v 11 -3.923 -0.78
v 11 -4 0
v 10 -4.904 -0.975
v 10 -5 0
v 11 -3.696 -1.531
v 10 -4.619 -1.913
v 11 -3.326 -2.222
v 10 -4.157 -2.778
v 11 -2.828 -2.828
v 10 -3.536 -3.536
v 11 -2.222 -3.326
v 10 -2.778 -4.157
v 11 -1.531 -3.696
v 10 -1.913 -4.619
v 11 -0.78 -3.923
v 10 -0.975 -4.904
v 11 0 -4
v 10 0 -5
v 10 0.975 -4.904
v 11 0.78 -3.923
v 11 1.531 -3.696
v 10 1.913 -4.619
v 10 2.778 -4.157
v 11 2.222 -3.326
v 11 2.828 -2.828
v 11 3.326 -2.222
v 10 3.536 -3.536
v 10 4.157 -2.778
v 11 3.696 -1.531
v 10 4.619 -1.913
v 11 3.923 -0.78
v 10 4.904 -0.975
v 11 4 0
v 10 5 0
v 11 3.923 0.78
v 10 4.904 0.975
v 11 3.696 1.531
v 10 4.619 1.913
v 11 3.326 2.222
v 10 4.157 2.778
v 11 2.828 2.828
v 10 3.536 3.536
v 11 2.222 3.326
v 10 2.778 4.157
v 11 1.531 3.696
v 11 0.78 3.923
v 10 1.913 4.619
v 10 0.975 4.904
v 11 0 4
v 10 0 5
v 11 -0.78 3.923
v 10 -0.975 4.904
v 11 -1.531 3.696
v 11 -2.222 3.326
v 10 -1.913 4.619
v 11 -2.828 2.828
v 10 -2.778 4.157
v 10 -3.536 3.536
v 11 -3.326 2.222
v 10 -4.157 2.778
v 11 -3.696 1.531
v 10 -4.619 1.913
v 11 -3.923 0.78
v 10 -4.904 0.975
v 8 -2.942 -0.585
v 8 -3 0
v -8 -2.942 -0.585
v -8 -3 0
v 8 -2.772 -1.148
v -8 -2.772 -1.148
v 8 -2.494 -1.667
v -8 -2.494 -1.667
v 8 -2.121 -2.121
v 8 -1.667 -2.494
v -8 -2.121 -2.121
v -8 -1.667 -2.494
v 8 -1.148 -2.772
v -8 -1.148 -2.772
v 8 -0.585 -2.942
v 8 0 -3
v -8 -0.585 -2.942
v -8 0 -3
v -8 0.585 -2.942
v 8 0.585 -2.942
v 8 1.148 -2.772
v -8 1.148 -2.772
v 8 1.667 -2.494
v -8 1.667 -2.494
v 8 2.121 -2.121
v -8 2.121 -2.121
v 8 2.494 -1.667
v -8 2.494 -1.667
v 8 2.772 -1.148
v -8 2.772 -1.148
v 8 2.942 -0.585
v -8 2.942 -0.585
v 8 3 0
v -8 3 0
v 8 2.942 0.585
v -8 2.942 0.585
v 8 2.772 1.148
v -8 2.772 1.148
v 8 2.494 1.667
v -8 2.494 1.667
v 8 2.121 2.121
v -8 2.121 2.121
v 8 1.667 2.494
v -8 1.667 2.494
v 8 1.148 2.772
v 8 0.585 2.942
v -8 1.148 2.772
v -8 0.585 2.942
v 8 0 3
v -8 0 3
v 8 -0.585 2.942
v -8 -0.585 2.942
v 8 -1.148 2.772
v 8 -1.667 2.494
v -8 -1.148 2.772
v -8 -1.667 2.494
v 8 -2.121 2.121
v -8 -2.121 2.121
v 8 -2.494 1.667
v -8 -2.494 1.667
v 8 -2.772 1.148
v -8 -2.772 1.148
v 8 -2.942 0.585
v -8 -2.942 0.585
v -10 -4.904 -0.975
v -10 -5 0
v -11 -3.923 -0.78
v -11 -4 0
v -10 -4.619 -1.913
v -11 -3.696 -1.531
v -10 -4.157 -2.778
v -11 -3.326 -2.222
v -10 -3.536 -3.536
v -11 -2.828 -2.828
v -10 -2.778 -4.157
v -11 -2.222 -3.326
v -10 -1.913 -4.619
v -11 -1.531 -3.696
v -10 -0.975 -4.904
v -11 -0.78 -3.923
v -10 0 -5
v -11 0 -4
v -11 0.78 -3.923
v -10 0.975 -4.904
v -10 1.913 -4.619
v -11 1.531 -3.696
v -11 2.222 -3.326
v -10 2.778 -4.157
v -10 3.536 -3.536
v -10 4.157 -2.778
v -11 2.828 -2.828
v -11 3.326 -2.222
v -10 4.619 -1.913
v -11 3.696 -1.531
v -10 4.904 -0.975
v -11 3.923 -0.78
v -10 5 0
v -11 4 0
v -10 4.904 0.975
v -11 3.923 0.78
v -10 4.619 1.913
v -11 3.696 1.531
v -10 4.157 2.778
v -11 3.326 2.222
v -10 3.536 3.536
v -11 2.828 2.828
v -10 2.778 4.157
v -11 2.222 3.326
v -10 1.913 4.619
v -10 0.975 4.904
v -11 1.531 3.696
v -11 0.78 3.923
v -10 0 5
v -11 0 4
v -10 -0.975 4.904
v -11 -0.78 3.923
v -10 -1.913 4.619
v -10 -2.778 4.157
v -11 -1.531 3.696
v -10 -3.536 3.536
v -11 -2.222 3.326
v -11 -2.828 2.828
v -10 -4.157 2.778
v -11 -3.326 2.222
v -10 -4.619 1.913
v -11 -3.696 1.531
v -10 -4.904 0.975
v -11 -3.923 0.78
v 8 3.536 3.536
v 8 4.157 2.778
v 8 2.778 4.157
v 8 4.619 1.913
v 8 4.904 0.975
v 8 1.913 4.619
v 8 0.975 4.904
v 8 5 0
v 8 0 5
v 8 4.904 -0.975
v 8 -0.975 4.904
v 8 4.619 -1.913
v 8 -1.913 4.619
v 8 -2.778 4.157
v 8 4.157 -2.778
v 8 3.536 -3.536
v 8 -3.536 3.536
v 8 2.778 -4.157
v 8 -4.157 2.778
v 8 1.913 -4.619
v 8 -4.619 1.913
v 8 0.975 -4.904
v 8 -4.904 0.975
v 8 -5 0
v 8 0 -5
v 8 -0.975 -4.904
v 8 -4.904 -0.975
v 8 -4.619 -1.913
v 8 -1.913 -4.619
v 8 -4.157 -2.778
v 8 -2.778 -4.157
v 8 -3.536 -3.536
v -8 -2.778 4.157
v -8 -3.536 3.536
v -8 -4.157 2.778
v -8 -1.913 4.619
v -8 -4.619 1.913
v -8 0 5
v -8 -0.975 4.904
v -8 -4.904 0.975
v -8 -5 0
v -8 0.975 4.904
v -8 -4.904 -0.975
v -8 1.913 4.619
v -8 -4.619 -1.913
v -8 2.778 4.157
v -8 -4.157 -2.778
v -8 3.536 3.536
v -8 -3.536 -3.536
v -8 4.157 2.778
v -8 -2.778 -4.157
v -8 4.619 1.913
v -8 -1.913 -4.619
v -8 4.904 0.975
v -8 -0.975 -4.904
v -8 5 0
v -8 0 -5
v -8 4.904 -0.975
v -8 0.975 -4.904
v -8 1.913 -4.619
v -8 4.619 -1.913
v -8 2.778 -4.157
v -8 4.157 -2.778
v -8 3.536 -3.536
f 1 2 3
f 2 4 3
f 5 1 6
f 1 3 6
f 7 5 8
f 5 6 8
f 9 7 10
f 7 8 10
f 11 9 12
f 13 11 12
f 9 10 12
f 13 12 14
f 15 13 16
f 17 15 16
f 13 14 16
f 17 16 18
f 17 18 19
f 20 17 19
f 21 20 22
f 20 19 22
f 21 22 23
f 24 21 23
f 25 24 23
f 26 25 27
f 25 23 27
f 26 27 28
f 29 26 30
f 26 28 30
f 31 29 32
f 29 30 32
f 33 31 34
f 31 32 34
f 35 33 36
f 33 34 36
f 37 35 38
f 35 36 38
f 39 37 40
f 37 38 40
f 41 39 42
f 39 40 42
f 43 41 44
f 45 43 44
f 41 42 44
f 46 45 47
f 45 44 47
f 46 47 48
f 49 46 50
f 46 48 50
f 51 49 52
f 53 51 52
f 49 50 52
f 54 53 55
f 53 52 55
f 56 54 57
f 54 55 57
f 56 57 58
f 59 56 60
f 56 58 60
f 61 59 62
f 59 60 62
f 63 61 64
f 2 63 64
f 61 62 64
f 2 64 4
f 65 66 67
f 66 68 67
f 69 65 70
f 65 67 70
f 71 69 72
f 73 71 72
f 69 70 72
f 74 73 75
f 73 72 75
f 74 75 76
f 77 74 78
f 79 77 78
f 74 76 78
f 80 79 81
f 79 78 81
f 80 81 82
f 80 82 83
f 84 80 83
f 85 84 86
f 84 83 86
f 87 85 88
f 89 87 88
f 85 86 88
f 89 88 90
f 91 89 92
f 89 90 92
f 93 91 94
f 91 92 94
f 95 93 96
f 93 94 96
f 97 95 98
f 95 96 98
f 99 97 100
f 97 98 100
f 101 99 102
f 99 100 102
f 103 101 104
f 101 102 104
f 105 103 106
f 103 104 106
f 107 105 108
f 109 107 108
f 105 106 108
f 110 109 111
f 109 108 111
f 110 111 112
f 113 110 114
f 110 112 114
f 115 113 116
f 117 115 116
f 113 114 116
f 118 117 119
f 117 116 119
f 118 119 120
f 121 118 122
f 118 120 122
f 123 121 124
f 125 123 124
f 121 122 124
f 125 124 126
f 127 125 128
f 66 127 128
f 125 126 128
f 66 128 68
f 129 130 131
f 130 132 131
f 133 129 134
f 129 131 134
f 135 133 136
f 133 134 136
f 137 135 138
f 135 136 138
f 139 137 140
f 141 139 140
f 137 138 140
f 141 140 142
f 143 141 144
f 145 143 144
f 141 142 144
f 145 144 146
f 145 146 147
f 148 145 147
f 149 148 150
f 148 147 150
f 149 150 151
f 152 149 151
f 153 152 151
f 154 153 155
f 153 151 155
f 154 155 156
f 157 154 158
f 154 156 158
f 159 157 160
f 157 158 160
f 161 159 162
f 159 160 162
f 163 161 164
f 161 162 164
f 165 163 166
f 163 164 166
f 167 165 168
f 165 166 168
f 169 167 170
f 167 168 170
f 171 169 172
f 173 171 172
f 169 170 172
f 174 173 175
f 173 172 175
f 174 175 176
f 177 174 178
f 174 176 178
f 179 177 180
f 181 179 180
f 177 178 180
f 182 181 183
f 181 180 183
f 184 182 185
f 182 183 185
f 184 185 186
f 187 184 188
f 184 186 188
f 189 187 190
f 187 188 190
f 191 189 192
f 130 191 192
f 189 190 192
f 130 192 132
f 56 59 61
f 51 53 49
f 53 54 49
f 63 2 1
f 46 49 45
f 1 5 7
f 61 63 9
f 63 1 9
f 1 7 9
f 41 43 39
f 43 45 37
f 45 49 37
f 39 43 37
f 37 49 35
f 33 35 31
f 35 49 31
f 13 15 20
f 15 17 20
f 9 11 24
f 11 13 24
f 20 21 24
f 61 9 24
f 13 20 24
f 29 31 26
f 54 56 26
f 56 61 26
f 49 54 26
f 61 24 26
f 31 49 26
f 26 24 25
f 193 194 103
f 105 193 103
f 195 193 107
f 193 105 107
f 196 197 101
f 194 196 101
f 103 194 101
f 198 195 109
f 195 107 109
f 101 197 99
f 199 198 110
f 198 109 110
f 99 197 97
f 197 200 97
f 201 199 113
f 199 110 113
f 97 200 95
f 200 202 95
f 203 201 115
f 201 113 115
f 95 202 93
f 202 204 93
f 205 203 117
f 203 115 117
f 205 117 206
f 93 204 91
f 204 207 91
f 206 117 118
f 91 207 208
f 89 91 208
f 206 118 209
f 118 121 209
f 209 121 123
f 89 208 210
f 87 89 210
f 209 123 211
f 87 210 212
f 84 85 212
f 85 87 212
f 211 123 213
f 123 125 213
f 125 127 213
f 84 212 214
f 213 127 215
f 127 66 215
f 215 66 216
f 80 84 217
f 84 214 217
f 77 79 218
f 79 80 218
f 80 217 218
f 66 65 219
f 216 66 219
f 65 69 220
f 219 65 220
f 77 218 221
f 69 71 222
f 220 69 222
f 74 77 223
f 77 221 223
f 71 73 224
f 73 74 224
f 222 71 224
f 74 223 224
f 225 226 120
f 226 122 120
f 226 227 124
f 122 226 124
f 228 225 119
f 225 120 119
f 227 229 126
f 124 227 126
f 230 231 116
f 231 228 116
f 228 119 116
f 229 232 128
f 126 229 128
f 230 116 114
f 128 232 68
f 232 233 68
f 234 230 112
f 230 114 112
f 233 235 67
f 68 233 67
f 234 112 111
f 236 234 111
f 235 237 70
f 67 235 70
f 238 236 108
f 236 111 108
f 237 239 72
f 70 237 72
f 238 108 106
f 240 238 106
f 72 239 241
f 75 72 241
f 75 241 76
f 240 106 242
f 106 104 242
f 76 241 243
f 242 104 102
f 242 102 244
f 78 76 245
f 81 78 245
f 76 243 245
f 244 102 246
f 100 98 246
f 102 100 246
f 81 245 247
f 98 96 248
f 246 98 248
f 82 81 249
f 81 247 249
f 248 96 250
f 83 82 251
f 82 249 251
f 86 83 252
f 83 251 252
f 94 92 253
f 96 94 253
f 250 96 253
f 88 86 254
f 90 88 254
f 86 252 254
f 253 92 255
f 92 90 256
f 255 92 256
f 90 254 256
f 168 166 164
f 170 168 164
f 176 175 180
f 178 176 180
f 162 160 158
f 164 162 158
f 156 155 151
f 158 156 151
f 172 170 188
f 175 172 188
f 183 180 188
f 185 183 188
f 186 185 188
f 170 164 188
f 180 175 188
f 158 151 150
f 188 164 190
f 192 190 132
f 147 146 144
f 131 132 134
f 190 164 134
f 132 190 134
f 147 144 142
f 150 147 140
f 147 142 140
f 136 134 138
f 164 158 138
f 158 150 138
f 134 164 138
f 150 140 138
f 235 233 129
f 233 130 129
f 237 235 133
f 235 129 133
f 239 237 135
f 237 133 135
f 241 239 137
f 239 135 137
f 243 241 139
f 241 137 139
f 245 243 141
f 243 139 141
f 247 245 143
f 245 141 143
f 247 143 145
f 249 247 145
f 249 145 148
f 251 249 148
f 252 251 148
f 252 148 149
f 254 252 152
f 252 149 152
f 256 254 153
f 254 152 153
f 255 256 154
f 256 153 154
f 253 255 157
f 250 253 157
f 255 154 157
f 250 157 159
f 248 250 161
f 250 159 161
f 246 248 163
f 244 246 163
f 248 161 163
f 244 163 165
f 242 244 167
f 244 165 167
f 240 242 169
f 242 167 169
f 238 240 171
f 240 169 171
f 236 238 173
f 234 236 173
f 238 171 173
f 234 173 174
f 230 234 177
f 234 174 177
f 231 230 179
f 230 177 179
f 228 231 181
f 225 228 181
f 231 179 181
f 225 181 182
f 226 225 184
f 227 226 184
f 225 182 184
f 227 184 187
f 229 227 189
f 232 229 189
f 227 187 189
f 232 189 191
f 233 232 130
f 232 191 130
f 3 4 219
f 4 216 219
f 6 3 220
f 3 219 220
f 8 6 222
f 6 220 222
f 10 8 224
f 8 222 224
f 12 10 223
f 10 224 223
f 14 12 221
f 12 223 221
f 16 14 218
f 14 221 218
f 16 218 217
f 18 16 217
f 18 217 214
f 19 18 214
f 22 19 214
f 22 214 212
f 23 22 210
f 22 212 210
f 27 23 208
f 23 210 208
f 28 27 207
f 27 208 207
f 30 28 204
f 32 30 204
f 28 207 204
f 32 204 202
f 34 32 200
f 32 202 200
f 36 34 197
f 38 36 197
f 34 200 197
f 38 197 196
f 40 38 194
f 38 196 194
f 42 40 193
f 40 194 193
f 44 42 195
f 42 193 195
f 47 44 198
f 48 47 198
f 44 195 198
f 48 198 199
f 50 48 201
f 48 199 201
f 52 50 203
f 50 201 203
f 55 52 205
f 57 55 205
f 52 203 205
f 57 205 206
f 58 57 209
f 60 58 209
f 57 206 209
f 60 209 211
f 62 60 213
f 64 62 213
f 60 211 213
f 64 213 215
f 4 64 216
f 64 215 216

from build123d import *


with BuildPart() as part:
    # Esquisse1 → Révolution1 (revolve)
    with BuildSketch(Plane.XY):
        Polygon((-11, 0), (11, 0), (11, -4), (10, -5), (8, -5), (8, -3), (-8, -3), (-8, -5), (-10, -5), (-11, -4), align=None)
    revolve(axis=Axis((-11, 0, 0), (1, 0, 0)))


solid = part.part
